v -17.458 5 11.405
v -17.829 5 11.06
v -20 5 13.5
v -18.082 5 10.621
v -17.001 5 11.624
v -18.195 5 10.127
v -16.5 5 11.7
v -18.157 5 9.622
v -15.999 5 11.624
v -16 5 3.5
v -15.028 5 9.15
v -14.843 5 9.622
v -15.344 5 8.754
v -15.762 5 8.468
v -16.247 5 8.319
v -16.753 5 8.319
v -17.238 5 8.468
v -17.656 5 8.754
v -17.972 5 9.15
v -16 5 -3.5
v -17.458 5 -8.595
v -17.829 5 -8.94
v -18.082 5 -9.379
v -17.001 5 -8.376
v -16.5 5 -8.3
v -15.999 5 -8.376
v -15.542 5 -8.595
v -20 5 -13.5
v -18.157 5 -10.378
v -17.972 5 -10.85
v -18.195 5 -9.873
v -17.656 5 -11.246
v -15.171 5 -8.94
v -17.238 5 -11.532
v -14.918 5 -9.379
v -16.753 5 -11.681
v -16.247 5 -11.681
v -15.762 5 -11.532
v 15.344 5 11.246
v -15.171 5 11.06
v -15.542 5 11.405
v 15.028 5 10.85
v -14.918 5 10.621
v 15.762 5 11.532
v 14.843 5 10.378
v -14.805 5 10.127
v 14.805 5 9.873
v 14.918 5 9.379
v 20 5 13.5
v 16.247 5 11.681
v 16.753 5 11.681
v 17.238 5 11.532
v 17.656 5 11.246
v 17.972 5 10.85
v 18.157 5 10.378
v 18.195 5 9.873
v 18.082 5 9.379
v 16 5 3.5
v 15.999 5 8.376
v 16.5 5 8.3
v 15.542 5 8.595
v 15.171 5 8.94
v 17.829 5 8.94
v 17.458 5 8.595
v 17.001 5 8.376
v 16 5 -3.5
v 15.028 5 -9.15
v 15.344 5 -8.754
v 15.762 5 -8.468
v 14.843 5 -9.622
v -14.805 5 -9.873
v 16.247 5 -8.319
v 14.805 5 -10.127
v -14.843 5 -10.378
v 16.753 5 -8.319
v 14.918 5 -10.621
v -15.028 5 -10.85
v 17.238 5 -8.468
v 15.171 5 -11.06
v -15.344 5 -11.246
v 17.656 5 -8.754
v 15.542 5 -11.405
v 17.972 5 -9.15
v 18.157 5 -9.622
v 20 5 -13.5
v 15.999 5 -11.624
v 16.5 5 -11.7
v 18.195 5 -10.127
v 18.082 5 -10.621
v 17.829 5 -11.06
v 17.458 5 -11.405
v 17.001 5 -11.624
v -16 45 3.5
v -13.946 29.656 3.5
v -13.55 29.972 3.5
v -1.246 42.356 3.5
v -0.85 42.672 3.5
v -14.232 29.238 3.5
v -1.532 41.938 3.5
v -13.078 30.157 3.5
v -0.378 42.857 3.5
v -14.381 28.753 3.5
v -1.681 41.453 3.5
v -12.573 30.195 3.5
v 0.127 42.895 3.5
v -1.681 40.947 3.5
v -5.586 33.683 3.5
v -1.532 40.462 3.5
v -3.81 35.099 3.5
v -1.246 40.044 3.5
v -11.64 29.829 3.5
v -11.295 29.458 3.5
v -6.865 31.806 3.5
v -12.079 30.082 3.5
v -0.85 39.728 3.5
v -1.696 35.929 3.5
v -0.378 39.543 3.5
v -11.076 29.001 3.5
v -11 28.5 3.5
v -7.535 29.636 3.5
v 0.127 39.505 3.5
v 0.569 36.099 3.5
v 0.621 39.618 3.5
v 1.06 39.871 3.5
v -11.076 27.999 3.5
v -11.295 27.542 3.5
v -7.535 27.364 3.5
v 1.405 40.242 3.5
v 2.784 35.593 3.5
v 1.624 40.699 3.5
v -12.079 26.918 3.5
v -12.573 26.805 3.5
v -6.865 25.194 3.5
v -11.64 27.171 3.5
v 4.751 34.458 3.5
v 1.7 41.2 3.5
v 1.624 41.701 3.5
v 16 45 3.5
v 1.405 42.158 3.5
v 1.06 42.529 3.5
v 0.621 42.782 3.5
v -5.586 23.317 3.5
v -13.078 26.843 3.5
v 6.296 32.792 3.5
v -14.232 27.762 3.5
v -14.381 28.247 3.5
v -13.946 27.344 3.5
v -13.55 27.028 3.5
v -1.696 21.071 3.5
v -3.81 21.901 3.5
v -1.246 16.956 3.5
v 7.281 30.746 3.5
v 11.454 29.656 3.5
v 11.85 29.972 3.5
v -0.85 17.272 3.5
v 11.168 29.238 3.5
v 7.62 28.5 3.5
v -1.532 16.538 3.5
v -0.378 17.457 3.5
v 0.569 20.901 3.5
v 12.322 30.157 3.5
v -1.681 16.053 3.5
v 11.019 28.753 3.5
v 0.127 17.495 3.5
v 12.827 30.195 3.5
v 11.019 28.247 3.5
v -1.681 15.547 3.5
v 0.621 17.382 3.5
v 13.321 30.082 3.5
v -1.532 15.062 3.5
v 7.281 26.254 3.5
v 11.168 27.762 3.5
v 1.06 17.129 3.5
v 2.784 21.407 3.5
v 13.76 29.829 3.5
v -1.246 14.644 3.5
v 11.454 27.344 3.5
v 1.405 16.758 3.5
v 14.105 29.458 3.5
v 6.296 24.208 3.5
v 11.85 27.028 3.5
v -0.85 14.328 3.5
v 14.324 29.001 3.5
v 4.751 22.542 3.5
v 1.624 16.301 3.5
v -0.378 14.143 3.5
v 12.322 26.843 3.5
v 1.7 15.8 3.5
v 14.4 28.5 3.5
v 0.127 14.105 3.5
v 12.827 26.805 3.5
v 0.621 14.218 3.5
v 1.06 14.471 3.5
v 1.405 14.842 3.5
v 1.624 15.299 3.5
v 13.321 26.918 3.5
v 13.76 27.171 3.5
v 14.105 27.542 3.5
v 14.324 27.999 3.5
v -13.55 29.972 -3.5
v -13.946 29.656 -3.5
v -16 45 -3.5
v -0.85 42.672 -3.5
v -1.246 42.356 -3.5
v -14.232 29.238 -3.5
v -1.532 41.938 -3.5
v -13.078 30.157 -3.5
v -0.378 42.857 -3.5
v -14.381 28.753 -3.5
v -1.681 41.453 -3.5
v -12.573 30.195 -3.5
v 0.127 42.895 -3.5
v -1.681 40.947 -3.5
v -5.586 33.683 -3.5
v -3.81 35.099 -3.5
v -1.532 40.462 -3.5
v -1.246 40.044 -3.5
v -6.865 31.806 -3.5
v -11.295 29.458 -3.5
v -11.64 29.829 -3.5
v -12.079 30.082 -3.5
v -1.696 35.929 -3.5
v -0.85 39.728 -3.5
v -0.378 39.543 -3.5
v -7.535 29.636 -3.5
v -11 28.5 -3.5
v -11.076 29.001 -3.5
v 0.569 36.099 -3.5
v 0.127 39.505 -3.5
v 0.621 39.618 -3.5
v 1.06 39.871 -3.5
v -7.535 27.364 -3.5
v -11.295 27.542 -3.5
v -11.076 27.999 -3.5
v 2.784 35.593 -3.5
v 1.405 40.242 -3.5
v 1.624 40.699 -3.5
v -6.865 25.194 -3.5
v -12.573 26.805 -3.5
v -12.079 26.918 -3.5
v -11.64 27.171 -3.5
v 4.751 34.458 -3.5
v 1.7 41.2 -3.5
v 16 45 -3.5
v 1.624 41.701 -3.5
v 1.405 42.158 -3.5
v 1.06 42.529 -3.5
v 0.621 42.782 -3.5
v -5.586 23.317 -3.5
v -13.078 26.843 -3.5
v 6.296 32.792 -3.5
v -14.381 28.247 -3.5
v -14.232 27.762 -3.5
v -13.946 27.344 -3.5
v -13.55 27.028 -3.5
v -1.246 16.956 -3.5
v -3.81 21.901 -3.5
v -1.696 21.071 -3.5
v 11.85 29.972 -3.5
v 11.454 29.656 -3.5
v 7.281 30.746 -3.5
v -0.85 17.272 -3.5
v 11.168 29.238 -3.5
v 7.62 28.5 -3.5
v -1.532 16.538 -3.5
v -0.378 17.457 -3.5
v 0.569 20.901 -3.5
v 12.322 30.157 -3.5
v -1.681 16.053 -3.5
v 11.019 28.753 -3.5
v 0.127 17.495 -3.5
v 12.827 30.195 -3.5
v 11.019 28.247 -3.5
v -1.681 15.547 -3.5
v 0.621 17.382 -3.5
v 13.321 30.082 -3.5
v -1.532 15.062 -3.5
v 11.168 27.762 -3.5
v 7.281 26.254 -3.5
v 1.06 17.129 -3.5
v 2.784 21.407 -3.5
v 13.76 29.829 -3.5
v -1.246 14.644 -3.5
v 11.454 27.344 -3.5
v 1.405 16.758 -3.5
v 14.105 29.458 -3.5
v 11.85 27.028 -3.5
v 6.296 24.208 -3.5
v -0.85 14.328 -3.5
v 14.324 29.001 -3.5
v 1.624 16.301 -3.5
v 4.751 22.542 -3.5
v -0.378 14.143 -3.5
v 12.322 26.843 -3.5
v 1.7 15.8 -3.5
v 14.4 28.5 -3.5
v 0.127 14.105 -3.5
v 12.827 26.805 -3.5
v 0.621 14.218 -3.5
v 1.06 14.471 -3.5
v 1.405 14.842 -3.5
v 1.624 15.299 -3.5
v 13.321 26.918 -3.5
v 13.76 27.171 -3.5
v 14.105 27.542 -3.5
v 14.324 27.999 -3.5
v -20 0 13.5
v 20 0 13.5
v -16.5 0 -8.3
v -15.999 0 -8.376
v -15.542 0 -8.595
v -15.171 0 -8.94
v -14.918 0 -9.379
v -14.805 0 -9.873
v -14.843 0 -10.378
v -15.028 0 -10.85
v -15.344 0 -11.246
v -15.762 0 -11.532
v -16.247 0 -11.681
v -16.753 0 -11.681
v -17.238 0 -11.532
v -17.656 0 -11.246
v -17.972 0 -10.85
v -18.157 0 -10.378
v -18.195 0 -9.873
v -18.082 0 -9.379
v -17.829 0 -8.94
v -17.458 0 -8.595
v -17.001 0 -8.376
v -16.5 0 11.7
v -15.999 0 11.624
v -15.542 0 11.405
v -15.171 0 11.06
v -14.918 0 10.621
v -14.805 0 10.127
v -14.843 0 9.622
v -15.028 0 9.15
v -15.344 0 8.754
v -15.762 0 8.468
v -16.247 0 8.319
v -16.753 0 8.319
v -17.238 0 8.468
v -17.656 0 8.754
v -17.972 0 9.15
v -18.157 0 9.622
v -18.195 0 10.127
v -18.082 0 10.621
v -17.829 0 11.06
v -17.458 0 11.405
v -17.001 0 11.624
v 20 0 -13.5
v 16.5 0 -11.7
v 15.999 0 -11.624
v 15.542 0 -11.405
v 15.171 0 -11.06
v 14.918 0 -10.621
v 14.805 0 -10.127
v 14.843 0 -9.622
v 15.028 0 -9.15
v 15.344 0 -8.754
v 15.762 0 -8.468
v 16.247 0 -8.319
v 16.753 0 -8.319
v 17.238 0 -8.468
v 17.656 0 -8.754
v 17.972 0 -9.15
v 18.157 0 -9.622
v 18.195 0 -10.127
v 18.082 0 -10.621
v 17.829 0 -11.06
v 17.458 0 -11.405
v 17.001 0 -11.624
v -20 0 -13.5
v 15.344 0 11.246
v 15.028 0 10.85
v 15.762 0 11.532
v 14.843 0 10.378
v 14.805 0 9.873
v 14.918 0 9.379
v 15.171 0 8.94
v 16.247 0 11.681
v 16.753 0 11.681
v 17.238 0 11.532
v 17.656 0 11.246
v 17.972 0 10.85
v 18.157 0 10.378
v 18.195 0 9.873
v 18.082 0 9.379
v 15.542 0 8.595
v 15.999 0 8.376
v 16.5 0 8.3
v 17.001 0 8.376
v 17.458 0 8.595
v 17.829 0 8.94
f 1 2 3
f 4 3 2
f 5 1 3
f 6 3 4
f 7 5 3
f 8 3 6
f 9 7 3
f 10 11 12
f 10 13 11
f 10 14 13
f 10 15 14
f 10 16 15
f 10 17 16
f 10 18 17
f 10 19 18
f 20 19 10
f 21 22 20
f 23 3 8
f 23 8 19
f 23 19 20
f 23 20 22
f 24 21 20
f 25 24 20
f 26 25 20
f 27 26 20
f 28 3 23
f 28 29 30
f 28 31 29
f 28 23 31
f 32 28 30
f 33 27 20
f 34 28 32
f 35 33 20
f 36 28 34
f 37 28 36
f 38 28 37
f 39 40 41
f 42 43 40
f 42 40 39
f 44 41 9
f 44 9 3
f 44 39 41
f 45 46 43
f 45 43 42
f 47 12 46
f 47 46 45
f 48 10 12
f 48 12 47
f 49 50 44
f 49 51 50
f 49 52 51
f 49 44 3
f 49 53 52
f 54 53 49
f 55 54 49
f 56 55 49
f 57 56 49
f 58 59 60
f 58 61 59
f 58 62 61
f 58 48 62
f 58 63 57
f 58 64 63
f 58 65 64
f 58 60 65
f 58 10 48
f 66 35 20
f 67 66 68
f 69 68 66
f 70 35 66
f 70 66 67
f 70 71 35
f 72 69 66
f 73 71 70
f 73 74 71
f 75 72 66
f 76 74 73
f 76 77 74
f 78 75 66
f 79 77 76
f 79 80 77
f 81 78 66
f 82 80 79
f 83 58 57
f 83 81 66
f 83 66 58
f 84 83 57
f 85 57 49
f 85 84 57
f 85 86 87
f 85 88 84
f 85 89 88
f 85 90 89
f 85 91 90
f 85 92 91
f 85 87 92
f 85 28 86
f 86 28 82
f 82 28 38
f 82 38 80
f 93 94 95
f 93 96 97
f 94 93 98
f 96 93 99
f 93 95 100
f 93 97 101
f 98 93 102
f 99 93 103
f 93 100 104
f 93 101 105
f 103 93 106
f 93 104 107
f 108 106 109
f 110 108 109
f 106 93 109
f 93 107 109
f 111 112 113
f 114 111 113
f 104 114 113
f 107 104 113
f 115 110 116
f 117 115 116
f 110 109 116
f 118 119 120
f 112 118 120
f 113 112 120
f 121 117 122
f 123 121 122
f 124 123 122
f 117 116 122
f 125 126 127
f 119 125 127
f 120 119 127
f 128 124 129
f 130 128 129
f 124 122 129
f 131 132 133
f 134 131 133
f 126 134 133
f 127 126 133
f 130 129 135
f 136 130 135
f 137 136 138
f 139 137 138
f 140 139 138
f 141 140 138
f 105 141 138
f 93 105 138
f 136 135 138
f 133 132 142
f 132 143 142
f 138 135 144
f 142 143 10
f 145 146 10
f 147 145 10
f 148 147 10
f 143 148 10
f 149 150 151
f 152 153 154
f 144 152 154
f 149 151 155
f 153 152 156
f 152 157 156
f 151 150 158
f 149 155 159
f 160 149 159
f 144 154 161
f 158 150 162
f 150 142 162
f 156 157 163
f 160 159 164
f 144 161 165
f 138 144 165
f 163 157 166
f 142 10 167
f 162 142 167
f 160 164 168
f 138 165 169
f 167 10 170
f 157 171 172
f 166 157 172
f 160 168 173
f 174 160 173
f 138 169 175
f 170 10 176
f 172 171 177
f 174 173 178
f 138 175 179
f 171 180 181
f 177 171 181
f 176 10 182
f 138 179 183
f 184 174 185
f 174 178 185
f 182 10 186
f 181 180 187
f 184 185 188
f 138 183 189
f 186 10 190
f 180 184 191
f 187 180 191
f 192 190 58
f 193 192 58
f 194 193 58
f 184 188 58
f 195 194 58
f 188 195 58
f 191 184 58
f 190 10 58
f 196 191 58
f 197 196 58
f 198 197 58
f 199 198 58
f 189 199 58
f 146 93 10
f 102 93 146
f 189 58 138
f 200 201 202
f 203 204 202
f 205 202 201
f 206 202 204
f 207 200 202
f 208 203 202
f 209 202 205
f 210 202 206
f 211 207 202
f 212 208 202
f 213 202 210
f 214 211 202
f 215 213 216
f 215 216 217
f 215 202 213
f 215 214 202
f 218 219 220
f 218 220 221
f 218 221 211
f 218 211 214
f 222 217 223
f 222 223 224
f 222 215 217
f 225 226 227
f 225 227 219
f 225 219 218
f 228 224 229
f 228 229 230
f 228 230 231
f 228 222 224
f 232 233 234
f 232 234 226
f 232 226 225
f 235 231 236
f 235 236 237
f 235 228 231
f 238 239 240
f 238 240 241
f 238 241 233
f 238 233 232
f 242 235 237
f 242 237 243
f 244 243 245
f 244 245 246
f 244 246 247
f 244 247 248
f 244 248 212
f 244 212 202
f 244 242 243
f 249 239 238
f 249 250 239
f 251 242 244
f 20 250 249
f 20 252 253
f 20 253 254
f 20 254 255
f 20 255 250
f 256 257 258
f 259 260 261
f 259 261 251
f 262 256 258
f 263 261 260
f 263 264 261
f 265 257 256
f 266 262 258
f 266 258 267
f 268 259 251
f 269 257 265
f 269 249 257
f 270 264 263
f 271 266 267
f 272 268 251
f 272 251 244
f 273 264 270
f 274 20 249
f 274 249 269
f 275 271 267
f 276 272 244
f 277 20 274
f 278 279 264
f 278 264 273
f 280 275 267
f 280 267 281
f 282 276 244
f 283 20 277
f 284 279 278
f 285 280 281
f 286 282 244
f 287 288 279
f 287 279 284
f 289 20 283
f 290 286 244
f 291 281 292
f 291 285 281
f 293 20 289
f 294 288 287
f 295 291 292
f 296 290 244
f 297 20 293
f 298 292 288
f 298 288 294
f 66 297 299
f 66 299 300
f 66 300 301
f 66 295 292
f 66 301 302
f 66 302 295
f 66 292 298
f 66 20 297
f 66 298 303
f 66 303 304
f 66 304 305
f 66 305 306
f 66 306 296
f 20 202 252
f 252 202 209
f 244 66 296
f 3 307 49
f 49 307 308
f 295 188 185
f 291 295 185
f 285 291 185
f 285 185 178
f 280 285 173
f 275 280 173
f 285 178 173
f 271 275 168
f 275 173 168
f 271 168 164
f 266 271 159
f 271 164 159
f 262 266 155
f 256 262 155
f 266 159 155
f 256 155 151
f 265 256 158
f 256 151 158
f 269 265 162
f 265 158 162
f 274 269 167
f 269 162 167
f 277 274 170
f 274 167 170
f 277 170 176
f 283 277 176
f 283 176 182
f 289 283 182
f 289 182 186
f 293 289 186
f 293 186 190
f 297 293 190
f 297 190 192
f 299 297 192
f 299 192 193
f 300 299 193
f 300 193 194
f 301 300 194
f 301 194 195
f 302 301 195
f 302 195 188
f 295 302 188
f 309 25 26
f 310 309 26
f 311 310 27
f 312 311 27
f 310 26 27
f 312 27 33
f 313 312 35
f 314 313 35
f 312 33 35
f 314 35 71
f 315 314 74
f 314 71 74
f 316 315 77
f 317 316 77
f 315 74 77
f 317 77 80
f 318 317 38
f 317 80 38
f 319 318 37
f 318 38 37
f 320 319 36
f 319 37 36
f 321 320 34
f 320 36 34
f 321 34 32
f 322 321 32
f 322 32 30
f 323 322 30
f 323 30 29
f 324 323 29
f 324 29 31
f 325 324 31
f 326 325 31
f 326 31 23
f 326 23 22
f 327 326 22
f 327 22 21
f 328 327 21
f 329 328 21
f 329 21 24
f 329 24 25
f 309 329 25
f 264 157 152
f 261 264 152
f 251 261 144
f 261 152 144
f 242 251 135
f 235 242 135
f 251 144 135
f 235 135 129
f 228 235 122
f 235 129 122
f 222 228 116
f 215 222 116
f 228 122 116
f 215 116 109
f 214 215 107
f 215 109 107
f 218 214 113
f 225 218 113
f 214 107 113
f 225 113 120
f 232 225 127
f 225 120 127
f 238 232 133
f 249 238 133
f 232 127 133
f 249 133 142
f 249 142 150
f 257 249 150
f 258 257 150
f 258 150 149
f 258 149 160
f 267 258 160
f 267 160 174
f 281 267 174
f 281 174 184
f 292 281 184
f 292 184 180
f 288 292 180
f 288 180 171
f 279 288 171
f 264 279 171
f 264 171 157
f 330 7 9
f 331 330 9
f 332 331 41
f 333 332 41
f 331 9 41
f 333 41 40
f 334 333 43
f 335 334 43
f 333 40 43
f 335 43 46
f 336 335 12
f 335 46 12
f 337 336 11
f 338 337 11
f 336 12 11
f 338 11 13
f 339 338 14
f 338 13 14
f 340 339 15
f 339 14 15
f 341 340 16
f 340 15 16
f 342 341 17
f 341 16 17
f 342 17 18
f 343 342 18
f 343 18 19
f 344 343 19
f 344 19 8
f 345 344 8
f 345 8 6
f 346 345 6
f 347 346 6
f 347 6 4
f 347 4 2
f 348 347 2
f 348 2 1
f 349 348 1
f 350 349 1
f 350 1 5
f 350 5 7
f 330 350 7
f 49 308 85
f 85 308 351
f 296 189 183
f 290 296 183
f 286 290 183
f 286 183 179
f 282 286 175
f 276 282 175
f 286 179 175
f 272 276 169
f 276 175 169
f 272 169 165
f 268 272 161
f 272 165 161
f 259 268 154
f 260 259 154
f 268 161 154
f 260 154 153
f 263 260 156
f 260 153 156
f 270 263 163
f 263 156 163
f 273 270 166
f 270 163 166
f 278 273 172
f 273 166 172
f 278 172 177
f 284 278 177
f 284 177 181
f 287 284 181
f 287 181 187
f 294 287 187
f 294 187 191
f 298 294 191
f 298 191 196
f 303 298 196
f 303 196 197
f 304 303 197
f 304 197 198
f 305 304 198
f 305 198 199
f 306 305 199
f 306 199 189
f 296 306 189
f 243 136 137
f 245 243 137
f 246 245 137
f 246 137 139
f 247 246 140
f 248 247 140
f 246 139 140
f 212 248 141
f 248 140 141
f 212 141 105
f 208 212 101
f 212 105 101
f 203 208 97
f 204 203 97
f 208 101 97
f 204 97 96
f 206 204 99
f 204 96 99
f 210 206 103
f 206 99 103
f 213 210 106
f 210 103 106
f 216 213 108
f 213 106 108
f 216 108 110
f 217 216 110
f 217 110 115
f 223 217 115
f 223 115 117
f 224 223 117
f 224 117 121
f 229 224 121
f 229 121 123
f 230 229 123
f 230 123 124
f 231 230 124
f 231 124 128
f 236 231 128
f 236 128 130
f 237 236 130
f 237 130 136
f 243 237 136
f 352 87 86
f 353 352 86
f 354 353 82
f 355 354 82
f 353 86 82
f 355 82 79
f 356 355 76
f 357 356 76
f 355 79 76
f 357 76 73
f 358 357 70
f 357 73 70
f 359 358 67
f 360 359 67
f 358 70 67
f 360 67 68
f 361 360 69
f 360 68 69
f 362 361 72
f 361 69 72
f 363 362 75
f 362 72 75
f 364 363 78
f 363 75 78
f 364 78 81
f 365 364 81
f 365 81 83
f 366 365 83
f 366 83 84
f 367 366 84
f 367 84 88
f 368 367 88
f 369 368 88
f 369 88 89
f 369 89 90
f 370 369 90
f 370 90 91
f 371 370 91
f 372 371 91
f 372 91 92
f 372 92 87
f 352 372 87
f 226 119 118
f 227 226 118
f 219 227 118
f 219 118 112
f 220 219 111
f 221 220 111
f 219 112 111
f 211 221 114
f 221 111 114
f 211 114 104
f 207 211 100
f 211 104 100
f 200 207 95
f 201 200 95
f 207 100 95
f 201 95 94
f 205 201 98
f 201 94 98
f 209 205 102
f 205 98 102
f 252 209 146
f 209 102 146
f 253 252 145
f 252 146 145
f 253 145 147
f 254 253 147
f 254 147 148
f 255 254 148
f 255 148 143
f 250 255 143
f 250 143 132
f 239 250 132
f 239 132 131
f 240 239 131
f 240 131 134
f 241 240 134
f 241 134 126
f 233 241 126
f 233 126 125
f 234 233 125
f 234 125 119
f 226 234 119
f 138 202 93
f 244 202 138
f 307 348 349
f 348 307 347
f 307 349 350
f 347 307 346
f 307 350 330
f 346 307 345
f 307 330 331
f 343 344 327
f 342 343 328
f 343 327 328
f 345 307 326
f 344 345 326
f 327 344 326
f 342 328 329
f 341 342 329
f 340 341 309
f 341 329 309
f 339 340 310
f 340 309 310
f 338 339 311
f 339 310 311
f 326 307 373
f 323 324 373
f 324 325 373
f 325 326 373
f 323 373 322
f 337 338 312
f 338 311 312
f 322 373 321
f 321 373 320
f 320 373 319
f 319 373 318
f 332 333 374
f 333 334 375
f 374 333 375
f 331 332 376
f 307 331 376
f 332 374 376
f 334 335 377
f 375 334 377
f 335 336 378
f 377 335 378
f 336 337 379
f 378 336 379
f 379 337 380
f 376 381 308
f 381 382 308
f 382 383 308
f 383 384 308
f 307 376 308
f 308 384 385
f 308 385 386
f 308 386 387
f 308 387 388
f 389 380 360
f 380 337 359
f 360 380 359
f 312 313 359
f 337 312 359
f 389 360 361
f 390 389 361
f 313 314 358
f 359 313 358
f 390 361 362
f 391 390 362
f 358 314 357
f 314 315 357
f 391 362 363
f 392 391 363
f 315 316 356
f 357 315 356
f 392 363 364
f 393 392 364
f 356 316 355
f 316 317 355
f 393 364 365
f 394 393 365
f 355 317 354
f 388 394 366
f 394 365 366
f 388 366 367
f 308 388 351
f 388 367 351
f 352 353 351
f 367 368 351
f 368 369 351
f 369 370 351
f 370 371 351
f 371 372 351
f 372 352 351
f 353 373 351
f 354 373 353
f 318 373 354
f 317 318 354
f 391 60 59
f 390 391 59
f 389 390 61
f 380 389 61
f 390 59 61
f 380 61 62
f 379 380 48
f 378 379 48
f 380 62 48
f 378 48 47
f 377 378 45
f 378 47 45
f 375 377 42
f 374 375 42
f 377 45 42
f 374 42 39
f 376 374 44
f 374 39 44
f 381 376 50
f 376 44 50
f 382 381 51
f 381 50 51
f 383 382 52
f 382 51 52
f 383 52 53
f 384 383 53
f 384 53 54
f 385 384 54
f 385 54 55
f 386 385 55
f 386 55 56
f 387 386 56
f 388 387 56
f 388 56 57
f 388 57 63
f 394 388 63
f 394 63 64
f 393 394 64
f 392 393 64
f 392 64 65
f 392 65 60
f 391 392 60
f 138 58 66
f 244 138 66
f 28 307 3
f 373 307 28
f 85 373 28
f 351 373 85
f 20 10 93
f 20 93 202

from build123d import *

# Parameters (mm, degrees)
SKETCH1_W           = 40
SKETCH1_H           = 27
SKETCH1_W_2         = 32
SKETCH1_H_2         = 7
BOSS_EXTRUDE1_DEPTH = 5
SKETCH1_3_W         = 32
SKETCH1_3_H         = 7
BOSS_EXTRUDE2_DEPTH = 45
CUT_EXTRUDE1_REACH  = 54.096
SKETCH2_R           = 7.62
CUT_EXTRUDE2_REACH  = 54.096
SKETCH4_R           = 1.7
CUT_EXTRUDE3_REACH  = 48.715
SKETCH5_R           = 1.7


with BuildPart() as part:
    # Sketch1 → Boss-Extrude1 (new body)
    with BuildSketch(Plane(origin=(0, 0, 0), x_dir=(1, 0, 0), z_dir=(0, 1, 0))):
        Rectangle(SKETCH1_W, SKETCH1_H)
        Rectangle(SKETCH1_W_2, SKETCH1_H_2, mode=Mode.SUBTRACT)
    extrude(amount=BOSS_EXTRUDE1_DEPTH)

    # Sketch1<3> → Boss-Extrude2 (add)
    with BuildSketch(Plane(origin=(0, 0, 0), x_dir=(1, 0, 0), z_dir=(0, 1, 0))):
        Rectangle(SKETCH1_3_W, SKETCH1_3_H)
    extrude(amount=BOSS_EXTRUDE2_DEPTH)

    # Sketch2 → Cut-Extrude1 (cut, up to next)
    with BuildSketch(Plane.XY.offset(3.5), mode=Mode.PRIVATE) as cut_extrude1_sk1:
        with Locations((0, 28.5)):
            Circle(SKETCH2_R)
    cut_extrude1_tool1 = extrude(cut_extrude1_sk1.sketch, amount=-CUT_EXTRUDE1_REACH, mode=Mode.PRIVATE) & part.part
    add(cut_extrude1_tool1.solids().sort_by_distance((0, 28.5, 3.5))[0], mode=Mode.SUBTRACT)

    # Sketch4 → Cut-Extrude2 (cut, up to next)
    with BuildSketch(Plane.XY.offset(3.5), mode=Mode.PRIVATE) as cut_extrude2_sk1:
        with Locations((0, 41.2)):
            Circle(SKETCH4_R)
    cut_extrude2_tool1 = extrude(cut_extrude2_sk1.sketch, amount=-CUT_EXTRUDE2_REACH, mode=Mode.PRIVATE) & part.part
    # Sketch4 → Cut-Extrude2 (cut, up to next)
    with BuildSketch(Plane.XY.offset(3.5), mode=Mode.PRIVATE) as cut_extrude2_sk2:
        with Locations((12.7, 28.5)):
            Circle(SKETCH4_R)
    cut_extrude2_tool2 = extrude(cut_extrude2_sk2.sketch, amount=-CUT_EXTRUDE2_REACH, mode=Mode.PRIVATE) & part.part
    # Sketch4 → Cut-Extrude2 (cut, up to next)
    with BuildSketch(Plane.XY.offset(3.5), mode=Mode.PRIVATE) as cut_extrude2_sk3:
        with Locations((0, 15.8)):
            Circle(SKETCH4_R)
    cut_extrude2_tool3 = extrude(cut_extrude2_sk3.sketch, amount=-CUT_EXTRUDE2_REACH, mode=Mode.PRIVATE) & part.part
    # Sketch4 → Cut-Extrude2 (cut, up to next)
    with BuildSketch(Plane.XY.offset(3.5), mode=Mode.PRIVATE) as cut_extrude2_sk4:
        with Locations((-12.7, 28.5)):
            Circle(SKETCH4_R)
    cut_extrude2_tool4 = extrude(cut_extrude2_sk4.sketch, amount=-CUT_EXTRUDE2_REACH, mode=Mode.PRIVATE) & part.part
    add(cut_extrude2_tool1.solids().sort_by_distance((0, 41.2, 3.5))[0], mode=Mode.SUBTRACT)
    add(cut_extrude2_tool2.solids().sort_by_distance((12.7, 28.5, 3.5))[0], mode=Mode.SUBTRACT)
    add(cut_extrude2_tool3.solids().sort_by_distance((0, 15.8, 3.5))[0], mode=Mode.SUBTRACT)
    add(cut_extrude2_tool4.solids().sort_by_distance((-12.7, 28.5, 3.5))[0], mode=Mode.SUBTRACT)

    # Sketch5 → Cut-Extrude3 (cut, up to next)
    with BuildSketch(Plane(origin=(0, 5, 0), x_dir=(1, 0, 0), z_dir=(0, 1, 0)), mode=Mode.PRIVATE) as cut_extrude3_sk1:
        with Locations((-16.5, 10)):
            Circle(SKETCH5_R)
    cut_extrude3_tool1 = extrude(cut_extrude3_sk1.sketch, amount=-CUT_EXTRUDE3_REACH, mode=Mode.PRIVATE) & part.part
    # Sketch5 → Cut-Extrude3 (cut, up to next)
    with BuildSketch(Plane(origin=(0, 5, 0), x_dir=(1, 0, 0), z_dir=(0, 1, 0)), mode=Mode.PRIVATE) as cut_extrude3_sk2:
        with Locations((-16.5, -10)):
            Circle(SKETCH5_R)
    cut_extrude3_tool2 = extrude(cut_extrude3_sk2.sketch, amount=-CUT_EXTRUDE3_REACH, mode=Mode.PRIVATE) & part.part
    # Sketch5 → Cut-Extrude3 (cut, up to next)
    with BuildSketch(Plane(origin=(0, 5, 0), x_dir=(1, 0, 0), z_dir=(0, 1, 0)), mode=Mode.PRIVATE) as cut_extrude3_sk3:
        with Locations((16.5, -10)):
            Circle(SKETCH5_R)
    cut_extrude3_tool3 = extrude(cut_extrude3_sk3.sketch, amount=-CUT_EXTRUDE3_REACH, mode=Mode.PRIVATE) & part.part
    # Sketch5 → Cut-Extrude3 (cut, up to next)
    with BuildSketch(Plane(origin=(0, 5, 0), x_dir=(1, 0, 0), z_dir=(0, 1, 0)), mode=Mode.PRIVATE) as cut_extrude3_sk4:
        with Locations((16.5, 10)):
            Circle(SKETCH5_R)
    cut_extrude3_tool4 = extrude(cut_extrude3_sk4.sketch, amount=-CUT_EXTRUDE3_REACH, mode=Mode.PRIVATE) & part.part
    add(cut_extrude3_tool1.solids().sort_by_distance((-16.5, 5, -10))[0], mode=Mode.SUBTRACT)
    add(cut_extrude3_tool2.solids().sort_by_distance((-16.5, 5, 10))[0], mode=Mode.SUBTRACT)
    add(cut_extrude3_tool3.solids().sort_by_distance((16.5, 5, 10))[0], mode=Mode.SUBTRACT)
    add(cut_extrude3_tool4.solids().sort_by_distance((16.5, 5, -10))[0], mode=Mode.SUBTRACT)


solid = part.part
